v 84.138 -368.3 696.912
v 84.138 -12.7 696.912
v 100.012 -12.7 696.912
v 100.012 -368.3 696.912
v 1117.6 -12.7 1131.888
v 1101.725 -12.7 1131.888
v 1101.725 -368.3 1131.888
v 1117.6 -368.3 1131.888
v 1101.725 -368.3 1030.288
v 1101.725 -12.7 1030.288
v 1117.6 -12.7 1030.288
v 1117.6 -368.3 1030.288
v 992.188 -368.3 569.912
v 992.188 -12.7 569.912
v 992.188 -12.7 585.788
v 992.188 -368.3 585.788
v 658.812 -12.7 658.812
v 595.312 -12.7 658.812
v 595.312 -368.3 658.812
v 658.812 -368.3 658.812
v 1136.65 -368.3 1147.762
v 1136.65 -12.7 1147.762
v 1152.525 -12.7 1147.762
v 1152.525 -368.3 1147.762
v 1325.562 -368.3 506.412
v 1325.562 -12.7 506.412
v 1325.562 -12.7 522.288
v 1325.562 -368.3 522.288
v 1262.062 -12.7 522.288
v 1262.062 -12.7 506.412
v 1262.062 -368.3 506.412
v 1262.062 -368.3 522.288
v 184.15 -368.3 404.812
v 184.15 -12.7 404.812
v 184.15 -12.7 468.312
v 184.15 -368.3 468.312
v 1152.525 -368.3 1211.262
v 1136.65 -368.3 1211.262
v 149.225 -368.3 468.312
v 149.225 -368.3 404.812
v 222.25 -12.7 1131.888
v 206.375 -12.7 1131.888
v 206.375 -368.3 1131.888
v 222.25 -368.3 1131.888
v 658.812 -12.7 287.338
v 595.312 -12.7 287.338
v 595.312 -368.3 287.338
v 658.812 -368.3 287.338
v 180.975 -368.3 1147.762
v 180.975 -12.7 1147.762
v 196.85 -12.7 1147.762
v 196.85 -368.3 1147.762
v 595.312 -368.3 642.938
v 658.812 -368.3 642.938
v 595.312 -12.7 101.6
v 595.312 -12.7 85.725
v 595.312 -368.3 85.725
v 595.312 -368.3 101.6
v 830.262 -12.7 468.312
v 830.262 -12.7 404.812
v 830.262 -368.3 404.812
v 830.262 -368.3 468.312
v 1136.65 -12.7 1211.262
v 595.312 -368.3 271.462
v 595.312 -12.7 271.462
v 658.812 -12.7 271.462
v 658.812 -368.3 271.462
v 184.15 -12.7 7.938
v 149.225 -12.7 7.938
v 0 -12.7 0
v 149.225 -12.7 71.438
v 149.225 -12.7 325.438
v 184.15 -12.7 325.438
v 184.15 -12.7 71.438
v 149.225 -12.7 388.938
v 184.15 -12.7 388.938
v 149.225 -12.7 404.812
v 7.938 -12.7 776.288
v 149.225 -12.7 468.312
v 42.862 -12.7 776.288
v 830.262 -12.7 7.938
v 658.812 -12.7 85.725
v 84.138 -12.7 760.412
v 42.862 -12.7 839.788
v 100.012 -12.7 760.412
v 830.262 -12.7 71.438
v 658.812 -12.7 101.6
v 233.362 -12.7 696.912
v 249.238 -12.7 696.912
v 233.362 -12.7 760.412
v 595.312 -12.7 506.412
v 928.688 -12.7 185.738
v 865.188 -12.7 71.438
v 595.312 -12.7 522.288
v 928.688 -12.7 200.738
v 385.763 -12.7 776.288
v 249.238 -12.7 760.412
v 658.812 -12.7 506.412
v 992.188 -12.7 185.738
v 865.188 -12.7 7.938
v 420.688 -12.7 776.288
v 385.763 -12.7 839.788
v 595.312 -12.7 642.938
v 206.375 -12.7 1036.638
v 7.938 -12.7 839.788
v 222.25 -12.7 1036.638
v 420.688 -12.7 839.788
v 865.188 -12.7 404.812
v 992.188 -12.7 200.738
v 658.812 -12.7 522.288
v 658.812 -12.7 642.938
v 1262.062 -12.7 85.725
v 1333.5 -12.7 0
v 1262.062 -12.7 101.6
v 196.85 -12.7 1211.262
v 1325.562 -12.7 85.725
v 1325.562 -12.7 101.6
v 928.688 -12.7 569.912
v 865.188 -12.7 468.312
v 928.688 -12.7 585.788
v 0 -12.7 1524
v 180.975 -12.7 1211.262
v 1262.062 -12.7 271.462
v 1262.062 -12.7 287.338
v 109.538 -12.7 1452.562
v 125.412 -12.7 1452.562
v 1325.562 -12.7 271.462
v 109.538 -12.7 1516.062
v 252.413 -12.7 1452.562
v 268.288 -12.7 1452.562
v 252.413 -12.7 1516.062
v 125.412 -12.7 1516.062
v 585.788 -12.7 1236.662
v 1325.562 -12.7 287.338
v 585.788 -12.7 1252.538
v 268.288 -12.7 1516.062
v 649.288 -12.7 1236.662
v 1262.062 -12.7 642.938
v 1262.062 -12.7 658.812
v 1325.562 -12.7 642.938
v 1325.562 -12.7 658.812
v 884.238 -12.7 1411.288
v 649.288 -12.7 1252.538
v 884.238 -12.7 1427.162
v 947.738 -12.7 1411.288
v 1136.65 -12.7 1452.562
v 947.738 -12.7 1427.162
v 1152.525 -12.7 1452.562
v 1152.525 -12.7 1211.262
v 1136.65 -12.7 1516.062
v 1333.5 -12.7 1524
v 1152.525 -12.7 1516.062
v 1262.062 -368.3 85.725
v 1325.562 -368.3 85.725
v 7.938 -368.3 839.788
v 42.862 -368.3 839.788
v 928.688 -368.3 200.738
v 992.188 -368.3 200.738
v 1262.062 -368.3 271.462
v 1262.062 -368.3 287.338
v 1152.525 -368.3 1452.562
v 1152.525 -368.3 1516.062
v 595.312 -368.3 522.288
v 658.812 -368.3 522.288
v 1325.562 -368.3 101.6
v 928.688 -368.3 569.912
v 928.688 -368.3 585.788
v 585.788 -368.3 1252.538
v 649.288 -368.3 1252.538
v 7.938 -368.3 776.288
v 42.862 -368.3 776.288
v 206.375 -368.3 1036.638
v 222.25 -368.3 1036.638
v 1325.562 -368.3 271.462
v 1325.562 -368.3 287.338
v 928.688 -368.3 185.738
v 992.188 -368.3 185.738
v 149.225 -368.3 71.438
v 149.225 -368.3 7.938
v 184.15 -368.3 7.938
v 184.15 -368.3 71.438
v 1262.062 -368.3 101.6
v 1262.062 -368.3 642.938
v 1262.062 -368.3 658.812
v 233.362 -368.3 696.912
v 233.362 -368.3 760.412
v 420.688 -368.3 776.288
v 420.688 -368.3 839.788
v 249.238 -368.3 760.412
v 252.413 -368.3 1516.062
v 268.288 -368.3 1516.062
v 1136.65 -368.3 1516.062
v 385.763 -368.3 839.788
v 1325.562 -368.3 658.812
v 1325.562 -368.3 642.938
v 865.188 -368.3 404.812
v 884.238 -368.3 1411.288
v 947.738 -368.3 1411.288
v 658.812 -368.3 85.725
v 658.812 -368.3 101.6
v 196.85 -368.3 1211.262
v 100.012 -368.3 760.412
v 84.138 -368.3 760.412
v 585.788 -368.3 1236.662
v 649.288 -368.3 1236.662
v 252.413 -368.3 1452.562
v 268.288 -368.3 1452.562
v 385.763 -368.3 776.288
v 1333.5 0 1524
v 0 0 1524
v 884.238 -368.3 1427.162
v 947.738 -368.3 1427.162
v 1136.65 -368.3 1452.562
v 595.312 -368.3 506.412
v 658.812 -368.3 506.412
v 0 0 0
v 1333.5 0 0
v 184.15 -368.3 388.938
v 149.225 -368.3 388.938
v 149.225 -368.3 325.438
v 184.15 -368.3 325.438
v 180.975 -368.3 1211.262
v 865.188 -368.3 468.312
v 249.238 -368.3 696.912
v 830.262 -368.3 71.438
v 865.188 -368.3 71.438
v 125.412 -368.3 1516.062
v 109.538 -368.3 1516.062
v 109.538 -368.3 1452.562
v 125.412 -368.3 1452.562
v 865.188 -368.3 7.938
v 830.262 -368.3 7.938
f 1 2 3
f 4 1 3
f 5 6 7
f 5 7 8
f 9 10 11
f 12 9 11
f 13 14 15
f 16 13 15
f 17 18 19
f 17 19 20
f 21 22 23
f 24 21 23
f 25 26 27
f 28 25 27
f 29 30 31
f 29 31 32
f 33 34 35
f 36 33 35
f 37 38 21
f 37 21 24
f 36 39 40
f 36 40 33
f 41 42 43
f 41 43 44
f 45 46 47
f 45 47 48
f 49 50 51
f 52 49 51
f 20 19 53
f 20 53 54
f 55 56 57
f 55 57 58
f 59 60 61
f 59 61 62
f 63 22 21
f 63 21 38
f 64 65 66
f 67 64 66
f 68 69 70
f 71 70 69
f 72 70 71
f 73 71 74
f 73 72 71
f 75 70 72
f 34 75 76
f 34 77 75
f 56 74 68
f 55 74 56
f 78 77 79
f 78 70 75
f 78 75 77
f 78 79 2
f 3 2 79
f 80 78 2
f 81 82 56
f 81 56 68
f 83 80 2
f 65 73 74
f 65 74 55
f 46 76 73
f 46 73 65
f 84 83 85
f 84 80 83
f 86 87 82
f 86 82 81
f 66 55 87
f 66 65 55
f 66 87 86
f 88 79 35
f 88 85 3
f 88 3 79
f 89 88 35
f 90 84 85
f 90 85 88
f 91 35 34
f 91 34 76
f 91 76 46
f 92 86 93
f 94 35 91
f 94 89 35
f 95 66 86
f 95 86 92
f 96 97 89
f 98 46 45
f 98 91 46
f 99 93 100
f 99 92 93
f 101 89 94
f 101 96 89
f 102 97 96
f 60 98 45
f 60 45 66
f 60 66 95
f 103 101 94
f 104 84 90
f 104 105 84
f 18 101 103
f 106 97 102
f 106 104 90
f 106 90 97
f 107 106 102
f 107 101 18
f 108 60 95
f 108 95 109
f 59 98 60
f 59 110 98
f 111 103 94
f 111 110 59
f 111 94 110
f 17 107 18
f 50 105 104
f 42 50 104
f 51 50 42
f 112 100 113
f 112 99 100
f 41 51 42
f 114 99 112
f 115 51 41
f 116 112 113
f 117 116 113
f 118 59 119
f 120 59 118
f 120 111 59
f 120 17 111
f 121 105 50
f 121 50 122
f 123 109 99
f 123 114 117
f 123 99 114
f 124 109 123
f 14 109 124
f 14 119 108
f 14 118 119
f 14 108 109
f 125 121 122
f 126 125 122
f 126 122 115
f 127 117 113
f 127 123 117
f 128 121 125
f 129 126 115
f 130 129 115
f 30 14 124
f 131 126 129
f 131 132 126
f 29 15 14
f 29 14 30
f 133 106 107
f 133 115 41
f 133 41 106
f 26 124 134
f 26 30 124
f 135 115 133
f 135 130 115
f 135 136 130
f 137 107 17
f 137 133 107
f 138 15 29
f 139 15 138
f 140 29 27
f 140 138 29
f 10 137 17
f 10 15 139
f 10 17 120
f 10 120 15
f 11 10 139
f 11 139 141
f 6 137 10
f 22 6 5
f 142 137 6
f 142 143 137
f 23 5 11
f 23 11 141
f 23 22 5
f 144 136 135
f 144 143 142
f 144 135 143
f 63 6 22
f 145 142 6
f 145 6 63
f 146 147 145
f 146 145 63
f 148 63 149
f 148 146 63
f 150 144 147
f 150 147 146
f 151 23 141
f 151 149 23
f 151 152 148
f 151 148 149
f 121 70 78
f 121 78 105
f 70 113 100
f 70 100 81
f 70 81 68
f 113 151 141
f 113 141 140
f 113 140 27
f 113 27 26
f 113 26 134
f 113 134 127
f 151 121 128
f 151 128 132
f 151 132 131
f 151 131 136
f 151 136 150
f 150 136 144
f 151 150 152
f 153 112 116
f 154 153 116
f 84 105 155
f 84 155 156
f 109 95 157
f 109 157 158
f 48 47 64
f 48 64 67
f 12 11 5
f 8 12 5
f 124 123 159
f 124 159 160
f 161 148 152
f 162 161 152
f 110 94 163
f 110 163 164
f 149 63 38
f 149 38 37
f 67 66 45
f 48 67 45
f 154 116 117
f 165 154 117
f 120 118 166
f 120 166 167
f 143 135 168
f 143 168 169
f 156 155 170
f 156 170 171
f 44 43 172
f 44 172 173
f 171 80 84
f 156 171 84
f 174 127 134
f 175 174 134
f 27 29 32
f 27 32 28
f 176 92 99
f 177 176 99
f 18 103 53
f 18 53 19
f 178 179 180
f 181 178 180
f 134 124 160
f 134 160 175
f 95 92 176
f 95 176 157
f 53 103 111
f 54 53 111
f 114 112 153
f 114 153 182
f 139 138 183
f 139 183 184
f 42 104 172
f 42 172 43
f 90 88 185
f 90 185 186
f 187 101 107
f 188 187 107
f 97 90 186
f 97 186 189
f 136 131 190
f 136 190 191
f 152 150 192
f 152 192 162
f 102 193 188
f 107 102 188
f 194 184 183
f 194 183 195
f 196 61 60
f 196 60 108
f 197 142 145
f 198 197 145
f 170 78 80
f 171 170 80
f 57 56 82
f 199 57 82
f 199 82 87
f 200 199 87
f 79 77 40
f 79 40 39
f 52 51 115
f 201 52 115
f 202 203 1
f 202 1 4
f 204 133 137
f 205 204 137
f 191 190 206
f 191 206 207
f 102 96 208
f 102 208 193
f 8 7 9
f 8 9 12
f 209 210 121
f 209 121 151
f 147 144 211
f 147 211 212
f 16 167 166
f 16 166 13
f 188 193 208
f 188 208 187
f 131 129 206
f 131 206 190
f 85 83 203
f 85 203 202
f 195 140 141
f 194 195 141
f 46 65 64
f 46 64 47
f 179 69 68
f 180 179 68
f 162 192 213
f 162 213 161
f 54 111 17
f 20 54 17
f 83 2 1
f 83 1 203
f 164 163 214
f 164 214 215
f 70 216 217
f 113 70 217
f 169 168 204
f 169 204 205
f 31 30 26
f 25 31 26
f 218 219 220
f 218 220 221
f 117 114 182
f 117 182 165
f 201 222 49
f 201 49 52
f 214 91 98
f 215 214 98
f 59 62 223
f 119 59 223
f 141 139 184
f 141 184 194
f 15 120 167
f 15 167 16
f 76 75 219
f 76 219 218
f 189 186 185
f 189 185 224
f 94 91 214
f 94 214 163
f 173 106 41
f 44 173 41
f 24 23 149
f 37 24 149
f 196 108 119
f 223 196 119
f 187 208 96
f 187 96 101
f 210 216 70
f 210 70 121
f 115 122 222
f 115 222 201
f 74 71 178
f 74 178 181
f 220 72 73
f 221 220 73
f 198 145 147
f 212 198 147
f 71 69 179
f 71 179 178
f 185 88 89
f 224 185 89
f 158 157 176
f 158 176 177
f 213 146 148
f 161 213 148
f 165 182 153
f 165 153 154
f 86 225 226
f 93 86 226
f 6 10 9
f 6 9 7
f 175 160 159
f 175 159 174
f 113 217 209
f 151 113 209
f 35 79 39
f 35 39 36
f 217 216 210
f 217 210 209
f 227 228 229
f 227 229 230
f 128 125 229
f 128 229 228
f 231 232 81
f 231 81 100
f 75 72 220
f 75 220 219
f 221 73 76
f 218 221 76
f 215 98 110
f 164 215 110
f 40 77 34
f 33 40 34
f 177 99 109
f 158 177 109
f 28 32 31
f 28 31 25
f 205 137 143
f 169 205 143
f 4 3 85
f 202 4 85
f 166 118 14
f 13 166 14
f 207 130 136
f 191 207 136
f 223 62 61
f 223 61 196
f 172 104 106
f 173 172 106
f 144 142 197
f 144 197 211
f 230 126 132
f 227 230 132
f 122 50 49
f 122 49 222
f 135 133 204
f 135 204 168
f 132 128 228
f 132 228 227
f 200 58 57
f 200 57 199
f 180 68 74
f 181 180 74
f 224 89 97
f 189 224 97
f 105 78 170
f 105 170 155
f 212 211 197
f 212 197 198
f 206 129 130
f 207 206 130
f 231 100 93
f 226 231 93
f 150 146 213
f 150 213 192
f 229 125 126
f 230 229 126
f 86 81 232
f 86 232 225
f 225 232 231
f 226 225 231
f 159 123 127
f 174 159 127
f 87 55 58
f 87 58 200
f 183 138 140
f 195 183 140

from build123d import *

# Parameters (mm, degrees)
F0_W     = 1333.5
F0_H     = 1524
F0_W_2   = 34.925
F0_H_2   = 63.5
F0_W_3   = 63.5
F0_H_3   = 15.875
F0_W_4   = 15.875
F0_H_4   = 15
F0_H_5   = 95.25
F0_W_5   = 184.15
F0_H_6   = 101.6
F1_DEPTH = 12.7
F2_START = 12.7
F2_DEPTH = 355.6


with BuildPart() as f1:
    # F0 (on Front) → F1 (new body)
    with BuildSketch(Plane.XZ):
        with Locations((666.75, 762)):
            Rectangle(F0_W, F0_H)
        with Locations((166.6875, 39.6875)):
            Rectangle(F0_W_2, F0_H_2, mode=Mode.SUBTRACT)
        with Locations((166.6875, 357.1875)):
            Rectangle(F0_W_2, F0_H_2, mode=Mode.SUBTRACT)
        with Locations((627.0625, 93.6625)):
            Rectangle(F0_W_3, F0_H_3, mode=Mode.SUBTRACT)
        with Locations((627.0625, 279.4)):
            Rectangle(F0_W_3, F0_H_3, mode=Mode.SUBTRACT)
        with Locations((166.6875, 436.5625)):
            Rectangle(F0_W_2, F0_H_2, mode=Mode.SUBTRACT)
        with Locations((92.075, 728.6625)):
            Rectangle(F0_W_4, F0_H_2, mode=Mode.SUBTRACT)
        with Locations((241.3, 728.6625)):
            Rectangle(F0_W_4, F0_H_2, mode=Mode.SUBTRACT)
        with Locations((627.0625, 514.35)):
            Rectangle(F0_W_3, F0_H_3, mode=Mode.SUBTRACT)
        with Locations((627.0625, 650.875)):
            Rectangle(F0_W_3, F0_H_3, mode=Mode.SUBTRACT)
        with Locations((847.725, 39.6875)):
            Rectangle(F0_W_2, F0_H_2, mode=Mode.SUBTRACT)
        with Locations((960.4375, 193.2375)):
            Rectangle(F0_W_3, F0_H_4, mode=Mode.SUBTRACT)
        with Locations((1293.8125, 93.6625)):
            Rectangle(F0_W_3, F0_H_3, mode=Mode.SUBTRACT)
        with Locations((1293.8125, 279.4)):
            Rectangle(F0_W_3, F0_H_3, mode=Mode.SUBTRACT)
        with Locations((847.725, 436.5625)):
            Rectangle(F0_W_2, F0_H_2, mode=Mode.SUBTRACT)
        with Locations((960.4375, 577.85)):
            Rectangle(F0_W_3, F0_H_3, mode=Mode.SUBTRACT)
        with Locations((1293.8125, 514.35)):
            Rectangle(F0_W_3, F0_H_3, mode=Mode.SUBTRACT)
        with Locations((1293.8125, 650.875)):
            Rectangle(F0_W_3, F0_H_3, mode=Mode.SUBTRACT)
        with Locations((25.4, 808.0375)):
            Rectangle(F0_W_2, F0_H_2, mode=Mode.SUBTRACT)
        with Locations((214.3125, 1084.2625)):
            Rectangle(F0_W_4, F0_H_5, mode=Mode.SUBTRACT)
        with Locations((403.225, 808.0375)):
            Rectangle(F0_W_2, F0_H_2, mode=Mode.SUBTRACT)
        with Locations((188.9125, 1179.5125)):
            Rectangle(F0_W_4, F0_H_2, mode=Mode.SUBTRACT)
        with Locations((117.475, 1484.3125)):
            Rectangle(F0_W_4, F0_H_2, mode=Mode.SUBTRACT)
        with Locations((260.35, 1484.3125)):
            Rectangle(F0_W_4, F0_H_2, mode=Mode.SUBTRACT)
        with Locations((617.5375, 1244.6)):
            Rectangle(F0_W_3, F0_H_3, mode=Mode.SUBTRACT)
        with Locations((477.8375, 1406.525)):
            Rectangle(F0_W_5, F0_H_3, mode=Mode.SUBTRACT)
        with Locations((1109.6625, 1081.0875)):
            Rectangle(F0_W_4, F0_H_6, mode=Mode.SUBTRACT)
        with Locations((915.9875, 1419.225)):
            Rectangle(F0_W_3, F0_H_3, mode=Mode.SUBTRACT)
        with Locations((1144.5875, 1179.5125)):
            Rectangle(F0_W_4, F0_H_2, mode=Mode.SUBTRACT)
        with Locations((1144.5875, 1484.3125)):
            Rectangle(F0_W_4, F0_H_2, mode=Mode.SUBTRACT)
        with Locations((477.8375, 1406.525)):
            Rectangle(F0_W_5, F0_H_3)
        with Locations((166.6875, 39.6875)):
            Rectangle(F0_W_2, F0_H_2)
        with Locations((847.725, 39.6875)):
            Rectangle(F0_W_2, F0_H_2)
        with Locations((166.6875, 357.1875)):
            Rectangle(F0_W_2, F0_H_2)
        with Locations((166.6875, 436.5625)):
            Rectangle(F0_W_2, F0_H_2)
        with Locations((847.725, 436.5625)):
            Rectangle(F0_W_2, F0_H_2)
        with Locations((403.225, 808.0375)):
            Rectangle(F0_W_2, F0_H_2)
        with Locations((25.4, 808.0375)):
            Rectangle(F0_W_2, F0_H_2)
        with Locations((1109.6625, 1081.0875)):
            Rectangle(F0_W_4, F0_H_6)
        with Locations((214.3125, 1084.2625)):
            Rectangle(F0_W_4, F0_H_5)
        with Locations((627.0625, 93.6625)):
            Rectangle(F0_W_3, F0_H_3)
        with Locations((627.0625, 279.4)):
            Rectangle(F0_W_3, F0_H_3)
        with Locations((1293.8125, 93.6625)):
            Rectangle(F0_W_3, F0_H_3)
        with Locations((1293.8125, 279.4)):
            Rectangle(F0_W_3, F0_H_3)
        with Locations((627.0625, 514.35)):
            Rectangle(F0_W_3, F0_H_3)
        with Locations((960.4375, 577.85)):
            Rectangle(F0_W_3, F0_H_3)
        with Locations((1293.8125, 514.35)):
            Rectangle(F0_W_3, F0_H_3)
        with Locations((1293.8125, 650.875)):
            Rectangle(F0_W_3, F0_H_3)
        with Locations((627.0625, 650.875)):
            Rectangle(F0_W_3, F0_H_3)
        with Locations((92.075, 728.6625)):
            Rectangle(F0_W_4, F0_H_2)
        with Locations((241.3, 728.6625)):
            Rectangle(F0_W_4, F0_H_2)
        with Locations((188.9125, 1179.5125)):
            Rectangle(F0_W_4, F0_H_2)
        with Locations((117.475, 1484.3125)):
            Rectangle(F0_W_4, F0_H_2)
        with Locations((260.35, 1484.3125)):
            Rectangle(F0_W_4, F0_H_2)
        with Locations((617.5375, 1244.6)):
            Rectangle(F0_W_3, F0_H_3)
        with Locations((915.9875, 1419.225)):
            Rectangle(F0_W_3, F0_H_3)
        with Locations((1144.5875, 1484.3125)):
            Rectangle(F0_W_4, F0_H_2)
        with Locations((1144.5875, 1179.5125)):
            Rectangle(F0_W_4, F0_H_2)
        with Locations((960.4375, 193.2375)):
            Rectangle(F0_W_3, F0_H_4)
    extrude(amount=F1_DEPTH)

    # F0 (on Front) → F2 (join)
    with BuildSketch(Plane.XZ.offset(F2_START)):
        with Locations((1144.5875, 1484.3125)):
            Rectangle(F0_W_4, F0_H_2)
        with Locations((1144.5875, 1179.5125)):
            Rectangle(F0_W_4, F0_H_2)
        with Locations((1109.6625, 1081.0875)):
            Rectangle(F0_W_4, F0_H_6)
        with Locations((915.9875, 1419.225)):
            Rectangle(F0_W_3, F0_H_3)
        with Locations((617.5375, 1244.6)):
            Rectangle(F0_W_3, F0_H_3)
        with Locations((188.9125, 1179.5125)):
            Rectangle(F0_W_4, F0_H_2)
        with Locations((260.35, 1484.3125)):
            Rectangle(F0_W_4, F0_H_2)
        with Locations((117.475, 1484.3125)):
            Rectangle(F0_W_4, F0_H_2)
        with Locations((25.4, 808.0375)):
            Rectangle(F0_W_2, F0_H_2)
        with Locations((214.3125, 1084.2625)):
            Rectangle(F0_W_4, F0_H_5)
        with Locations((403.225, 808.0375)):
            Rectangle(F0_W_2, F0_H_2)
        with Locations((241.3, 728.6625)):
            Rectangle(F0_W_4, F0_H_2)
        with Locations((92.075, 728.6625)):
            Rectangle(F0_W_4, F0_H_2)
        with Locations((166.6875, 436.5625)):
            Rectangle(F0_W_2, F0_H_2)
        with Locations((627.0625, 514.35)):
            Rectangle(F0_W_3, F0_H_3)
        with Locations((627.0625, 650.875)):
            Rectangle(F0_W_3, F0_H_3)
        with Locations((960.4375, 577.85)):
            Rectangle(F0_W_3, F0_H_3)
        with Locations((847.725, 436.5625)):
            Rectangle(F0_W_2, F0_H_2)
        with Locations((1293.8125, 514.35)):
            Rectangle(F0_W_3, F0_H_3)
        with Locations((1293.8125, 650.875)):
            Rectangle(F0_W_3, F0_H_3)
        with Locations((1293.8125, 93.6625)):
            Rectangle(F0_W_3, F0_H_3)
        with Locations((1293.8125, 279.4)):
            Rectangle(F0_W_3, F0_H_3)
        with Locations((960.4375, 193.2375)):
            Rectangle(F0_W_3, F0_H_4)
        with Locations((847.725, 39.6875)):
            Rectangle(F0_W_2, F0_H_2)
        with Locations((627.0625, 93.6625)):
            Rectangle(F0_W_3, F0_H_3)
        with Locations((627.0625, 279.4)):
            Rectangle(F0_W_3, F0_H_3)
        with Locations((166.6875, 39.6875)):
            Rectangle(F0_W_2, F0_H_2)
        with Locations((166.6875, 357.1875)):
            Rectangle(F0_W_2, F0_H_2)
    extrude(amount=F2_DEPTH)


solid = f1.part
